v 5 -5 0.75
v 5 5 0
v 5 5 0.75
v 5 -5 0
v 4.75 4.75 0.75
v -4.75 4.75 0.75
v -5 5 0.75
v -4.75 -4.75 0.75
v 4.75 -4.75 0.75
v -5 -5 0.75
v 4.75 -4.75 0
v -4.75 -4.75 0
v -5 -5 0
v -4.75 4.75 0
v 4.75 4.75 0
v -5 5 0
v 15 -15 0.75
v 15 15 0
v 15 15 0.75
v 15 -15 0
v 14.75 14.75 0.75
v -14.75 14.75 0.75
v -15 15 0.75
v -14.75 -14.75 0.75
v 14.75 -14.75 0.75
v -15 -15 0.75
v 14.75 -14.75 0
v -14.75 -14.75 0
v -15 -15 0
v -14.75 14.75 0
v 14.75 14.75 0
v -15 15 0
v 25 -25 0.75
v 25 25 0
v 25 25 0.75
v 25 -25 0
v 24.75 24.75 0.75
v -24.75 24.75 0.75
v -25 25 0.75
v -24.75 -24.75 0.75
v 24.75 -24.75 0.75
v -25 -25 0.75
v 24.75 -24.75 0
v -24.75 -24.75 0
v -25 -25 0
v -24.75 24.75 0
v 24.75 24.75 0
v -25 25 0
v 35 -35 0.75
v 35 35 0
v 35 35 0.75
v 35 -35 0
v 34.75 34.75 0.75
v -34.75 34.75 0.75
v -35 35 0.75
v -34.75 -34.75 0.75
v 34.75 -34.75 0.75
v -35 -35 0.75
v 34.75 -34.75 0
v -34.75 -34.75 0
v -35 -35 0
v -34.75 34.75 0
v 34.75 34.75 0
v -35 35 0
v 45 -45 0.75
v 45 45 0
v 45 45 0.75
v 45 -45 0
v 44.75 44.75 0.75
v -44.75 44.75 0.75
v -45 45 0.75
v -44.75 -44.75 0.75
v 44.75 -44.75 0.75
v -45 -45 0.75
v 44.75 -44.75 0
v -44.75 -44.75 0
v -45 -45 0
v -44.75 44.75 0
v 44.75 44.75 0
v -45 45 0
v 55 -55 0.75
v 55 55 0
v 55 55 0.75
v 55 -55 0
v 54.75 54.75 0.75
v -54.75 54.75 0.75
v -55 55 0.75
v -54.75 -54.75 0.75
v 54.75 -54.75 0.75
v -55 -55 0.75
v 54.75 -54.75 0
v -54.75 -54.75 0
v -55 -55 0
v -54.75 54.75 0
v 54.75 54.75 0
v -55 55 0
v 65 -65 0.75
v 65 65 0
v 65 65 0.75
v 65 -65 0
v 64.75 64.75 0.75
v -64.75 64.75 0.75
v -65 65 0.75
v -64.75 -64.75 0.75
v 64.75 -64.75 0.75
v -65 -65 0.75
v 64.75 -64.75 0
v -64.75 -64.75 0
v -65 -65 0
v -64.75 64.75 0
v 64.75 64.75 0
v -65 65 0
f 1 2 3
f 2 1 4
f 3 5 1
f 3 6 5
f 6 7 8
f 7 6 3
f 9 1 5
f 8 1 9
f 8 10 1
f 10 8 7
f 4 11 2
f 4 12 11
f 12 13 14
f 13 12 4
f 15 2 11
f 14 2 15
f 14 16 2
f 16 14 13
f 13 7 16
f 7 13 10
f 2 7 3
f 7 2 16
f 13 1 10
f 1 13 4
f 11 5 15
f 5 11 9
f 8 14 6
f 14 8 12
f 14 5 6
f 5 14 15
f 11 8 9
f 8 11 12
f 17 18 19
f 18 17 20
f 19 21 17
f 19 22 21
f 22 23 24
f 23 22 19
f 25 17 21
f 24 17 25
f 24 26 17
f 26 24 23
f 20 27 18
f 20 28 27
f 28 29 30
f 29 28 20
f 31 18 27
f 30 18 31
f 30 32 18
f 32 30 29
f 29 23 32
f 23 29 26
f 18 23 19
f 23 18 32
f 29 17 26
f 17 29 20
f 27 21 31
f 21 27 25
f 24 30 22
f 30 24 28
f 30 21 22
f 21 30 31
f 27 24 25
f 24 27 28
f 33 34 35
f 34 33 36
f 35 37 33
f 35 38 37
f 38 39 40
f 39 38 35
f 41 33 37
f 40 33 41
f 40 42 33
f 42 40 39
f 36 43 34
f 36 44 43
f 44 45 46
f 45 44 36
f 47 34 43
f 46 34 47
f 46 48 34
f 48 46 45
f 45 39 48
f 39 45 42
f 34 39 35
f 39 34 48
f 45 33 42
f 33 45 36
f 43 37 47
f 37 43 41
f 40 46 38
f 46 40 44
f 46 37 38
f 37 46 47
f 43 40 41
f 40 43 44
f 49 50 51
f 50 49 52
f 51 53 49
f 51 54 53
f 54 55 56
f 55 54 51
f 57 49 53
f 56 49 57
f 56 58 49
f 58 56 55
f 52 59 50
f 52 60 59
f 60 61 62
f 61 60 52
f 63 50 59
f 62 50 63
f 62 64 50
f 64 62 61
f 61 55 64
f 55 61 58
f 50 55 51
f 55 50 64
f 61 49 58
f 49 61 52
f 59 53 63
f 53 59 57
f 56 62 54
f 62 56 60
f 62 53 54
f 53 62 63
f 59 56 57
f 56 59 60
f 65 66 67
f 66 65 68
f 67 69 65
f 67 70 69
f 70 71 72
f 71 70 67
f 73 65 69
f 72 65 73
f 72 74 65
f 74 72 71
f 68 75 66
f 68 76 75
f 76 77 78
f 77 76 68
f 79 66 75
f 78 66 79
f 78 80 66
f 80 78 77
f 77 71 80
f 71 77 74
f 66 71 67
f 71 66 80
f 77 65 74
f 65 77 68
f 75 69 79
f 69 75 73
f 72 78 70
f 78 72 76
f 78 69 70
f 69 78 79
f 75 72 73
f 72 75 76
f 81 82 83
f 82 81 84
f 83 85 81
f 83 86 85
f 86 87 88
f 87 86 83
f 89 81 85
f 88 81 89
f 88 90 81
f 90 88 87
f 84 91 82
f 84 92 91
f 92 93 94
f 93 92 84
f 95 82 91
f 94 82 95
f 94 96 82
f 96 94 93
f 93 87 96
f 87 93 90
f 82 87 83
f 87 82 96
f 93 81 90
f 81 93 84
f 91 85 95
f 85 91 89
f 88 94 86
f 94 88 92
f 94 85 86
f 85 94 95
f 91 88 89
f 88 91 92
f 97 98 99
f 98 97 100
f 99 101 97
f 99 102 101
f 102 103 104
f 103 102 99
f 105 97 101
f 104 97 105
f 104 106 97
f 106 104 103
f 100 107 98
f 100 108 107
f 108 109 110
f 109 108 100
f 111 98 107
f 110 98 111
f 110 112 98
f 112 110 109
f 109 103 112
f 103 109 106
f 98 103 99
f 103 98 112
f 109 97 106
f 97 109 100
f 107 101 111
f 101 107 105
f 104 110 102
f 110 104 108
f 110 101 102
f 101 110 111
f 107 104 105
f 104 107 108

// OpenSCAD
//author: brandon sharp
//date: 2024 august 28
//purpose: bed leveling 3d ender pro
h = .75;
sqw = .50;
w = 140;
//i = 2;
for ( i = [10 : 20 : w]) {
    //cube params: [w, d, h]
    difference() {
        translate([-i/2, -i/2, 0]) cube([i , i , h]);
        translate([-(i - sqw)/2, -(i - sqw)/2, 0]) cube([i - sqw , i - sqw, h]);
    }   
}
